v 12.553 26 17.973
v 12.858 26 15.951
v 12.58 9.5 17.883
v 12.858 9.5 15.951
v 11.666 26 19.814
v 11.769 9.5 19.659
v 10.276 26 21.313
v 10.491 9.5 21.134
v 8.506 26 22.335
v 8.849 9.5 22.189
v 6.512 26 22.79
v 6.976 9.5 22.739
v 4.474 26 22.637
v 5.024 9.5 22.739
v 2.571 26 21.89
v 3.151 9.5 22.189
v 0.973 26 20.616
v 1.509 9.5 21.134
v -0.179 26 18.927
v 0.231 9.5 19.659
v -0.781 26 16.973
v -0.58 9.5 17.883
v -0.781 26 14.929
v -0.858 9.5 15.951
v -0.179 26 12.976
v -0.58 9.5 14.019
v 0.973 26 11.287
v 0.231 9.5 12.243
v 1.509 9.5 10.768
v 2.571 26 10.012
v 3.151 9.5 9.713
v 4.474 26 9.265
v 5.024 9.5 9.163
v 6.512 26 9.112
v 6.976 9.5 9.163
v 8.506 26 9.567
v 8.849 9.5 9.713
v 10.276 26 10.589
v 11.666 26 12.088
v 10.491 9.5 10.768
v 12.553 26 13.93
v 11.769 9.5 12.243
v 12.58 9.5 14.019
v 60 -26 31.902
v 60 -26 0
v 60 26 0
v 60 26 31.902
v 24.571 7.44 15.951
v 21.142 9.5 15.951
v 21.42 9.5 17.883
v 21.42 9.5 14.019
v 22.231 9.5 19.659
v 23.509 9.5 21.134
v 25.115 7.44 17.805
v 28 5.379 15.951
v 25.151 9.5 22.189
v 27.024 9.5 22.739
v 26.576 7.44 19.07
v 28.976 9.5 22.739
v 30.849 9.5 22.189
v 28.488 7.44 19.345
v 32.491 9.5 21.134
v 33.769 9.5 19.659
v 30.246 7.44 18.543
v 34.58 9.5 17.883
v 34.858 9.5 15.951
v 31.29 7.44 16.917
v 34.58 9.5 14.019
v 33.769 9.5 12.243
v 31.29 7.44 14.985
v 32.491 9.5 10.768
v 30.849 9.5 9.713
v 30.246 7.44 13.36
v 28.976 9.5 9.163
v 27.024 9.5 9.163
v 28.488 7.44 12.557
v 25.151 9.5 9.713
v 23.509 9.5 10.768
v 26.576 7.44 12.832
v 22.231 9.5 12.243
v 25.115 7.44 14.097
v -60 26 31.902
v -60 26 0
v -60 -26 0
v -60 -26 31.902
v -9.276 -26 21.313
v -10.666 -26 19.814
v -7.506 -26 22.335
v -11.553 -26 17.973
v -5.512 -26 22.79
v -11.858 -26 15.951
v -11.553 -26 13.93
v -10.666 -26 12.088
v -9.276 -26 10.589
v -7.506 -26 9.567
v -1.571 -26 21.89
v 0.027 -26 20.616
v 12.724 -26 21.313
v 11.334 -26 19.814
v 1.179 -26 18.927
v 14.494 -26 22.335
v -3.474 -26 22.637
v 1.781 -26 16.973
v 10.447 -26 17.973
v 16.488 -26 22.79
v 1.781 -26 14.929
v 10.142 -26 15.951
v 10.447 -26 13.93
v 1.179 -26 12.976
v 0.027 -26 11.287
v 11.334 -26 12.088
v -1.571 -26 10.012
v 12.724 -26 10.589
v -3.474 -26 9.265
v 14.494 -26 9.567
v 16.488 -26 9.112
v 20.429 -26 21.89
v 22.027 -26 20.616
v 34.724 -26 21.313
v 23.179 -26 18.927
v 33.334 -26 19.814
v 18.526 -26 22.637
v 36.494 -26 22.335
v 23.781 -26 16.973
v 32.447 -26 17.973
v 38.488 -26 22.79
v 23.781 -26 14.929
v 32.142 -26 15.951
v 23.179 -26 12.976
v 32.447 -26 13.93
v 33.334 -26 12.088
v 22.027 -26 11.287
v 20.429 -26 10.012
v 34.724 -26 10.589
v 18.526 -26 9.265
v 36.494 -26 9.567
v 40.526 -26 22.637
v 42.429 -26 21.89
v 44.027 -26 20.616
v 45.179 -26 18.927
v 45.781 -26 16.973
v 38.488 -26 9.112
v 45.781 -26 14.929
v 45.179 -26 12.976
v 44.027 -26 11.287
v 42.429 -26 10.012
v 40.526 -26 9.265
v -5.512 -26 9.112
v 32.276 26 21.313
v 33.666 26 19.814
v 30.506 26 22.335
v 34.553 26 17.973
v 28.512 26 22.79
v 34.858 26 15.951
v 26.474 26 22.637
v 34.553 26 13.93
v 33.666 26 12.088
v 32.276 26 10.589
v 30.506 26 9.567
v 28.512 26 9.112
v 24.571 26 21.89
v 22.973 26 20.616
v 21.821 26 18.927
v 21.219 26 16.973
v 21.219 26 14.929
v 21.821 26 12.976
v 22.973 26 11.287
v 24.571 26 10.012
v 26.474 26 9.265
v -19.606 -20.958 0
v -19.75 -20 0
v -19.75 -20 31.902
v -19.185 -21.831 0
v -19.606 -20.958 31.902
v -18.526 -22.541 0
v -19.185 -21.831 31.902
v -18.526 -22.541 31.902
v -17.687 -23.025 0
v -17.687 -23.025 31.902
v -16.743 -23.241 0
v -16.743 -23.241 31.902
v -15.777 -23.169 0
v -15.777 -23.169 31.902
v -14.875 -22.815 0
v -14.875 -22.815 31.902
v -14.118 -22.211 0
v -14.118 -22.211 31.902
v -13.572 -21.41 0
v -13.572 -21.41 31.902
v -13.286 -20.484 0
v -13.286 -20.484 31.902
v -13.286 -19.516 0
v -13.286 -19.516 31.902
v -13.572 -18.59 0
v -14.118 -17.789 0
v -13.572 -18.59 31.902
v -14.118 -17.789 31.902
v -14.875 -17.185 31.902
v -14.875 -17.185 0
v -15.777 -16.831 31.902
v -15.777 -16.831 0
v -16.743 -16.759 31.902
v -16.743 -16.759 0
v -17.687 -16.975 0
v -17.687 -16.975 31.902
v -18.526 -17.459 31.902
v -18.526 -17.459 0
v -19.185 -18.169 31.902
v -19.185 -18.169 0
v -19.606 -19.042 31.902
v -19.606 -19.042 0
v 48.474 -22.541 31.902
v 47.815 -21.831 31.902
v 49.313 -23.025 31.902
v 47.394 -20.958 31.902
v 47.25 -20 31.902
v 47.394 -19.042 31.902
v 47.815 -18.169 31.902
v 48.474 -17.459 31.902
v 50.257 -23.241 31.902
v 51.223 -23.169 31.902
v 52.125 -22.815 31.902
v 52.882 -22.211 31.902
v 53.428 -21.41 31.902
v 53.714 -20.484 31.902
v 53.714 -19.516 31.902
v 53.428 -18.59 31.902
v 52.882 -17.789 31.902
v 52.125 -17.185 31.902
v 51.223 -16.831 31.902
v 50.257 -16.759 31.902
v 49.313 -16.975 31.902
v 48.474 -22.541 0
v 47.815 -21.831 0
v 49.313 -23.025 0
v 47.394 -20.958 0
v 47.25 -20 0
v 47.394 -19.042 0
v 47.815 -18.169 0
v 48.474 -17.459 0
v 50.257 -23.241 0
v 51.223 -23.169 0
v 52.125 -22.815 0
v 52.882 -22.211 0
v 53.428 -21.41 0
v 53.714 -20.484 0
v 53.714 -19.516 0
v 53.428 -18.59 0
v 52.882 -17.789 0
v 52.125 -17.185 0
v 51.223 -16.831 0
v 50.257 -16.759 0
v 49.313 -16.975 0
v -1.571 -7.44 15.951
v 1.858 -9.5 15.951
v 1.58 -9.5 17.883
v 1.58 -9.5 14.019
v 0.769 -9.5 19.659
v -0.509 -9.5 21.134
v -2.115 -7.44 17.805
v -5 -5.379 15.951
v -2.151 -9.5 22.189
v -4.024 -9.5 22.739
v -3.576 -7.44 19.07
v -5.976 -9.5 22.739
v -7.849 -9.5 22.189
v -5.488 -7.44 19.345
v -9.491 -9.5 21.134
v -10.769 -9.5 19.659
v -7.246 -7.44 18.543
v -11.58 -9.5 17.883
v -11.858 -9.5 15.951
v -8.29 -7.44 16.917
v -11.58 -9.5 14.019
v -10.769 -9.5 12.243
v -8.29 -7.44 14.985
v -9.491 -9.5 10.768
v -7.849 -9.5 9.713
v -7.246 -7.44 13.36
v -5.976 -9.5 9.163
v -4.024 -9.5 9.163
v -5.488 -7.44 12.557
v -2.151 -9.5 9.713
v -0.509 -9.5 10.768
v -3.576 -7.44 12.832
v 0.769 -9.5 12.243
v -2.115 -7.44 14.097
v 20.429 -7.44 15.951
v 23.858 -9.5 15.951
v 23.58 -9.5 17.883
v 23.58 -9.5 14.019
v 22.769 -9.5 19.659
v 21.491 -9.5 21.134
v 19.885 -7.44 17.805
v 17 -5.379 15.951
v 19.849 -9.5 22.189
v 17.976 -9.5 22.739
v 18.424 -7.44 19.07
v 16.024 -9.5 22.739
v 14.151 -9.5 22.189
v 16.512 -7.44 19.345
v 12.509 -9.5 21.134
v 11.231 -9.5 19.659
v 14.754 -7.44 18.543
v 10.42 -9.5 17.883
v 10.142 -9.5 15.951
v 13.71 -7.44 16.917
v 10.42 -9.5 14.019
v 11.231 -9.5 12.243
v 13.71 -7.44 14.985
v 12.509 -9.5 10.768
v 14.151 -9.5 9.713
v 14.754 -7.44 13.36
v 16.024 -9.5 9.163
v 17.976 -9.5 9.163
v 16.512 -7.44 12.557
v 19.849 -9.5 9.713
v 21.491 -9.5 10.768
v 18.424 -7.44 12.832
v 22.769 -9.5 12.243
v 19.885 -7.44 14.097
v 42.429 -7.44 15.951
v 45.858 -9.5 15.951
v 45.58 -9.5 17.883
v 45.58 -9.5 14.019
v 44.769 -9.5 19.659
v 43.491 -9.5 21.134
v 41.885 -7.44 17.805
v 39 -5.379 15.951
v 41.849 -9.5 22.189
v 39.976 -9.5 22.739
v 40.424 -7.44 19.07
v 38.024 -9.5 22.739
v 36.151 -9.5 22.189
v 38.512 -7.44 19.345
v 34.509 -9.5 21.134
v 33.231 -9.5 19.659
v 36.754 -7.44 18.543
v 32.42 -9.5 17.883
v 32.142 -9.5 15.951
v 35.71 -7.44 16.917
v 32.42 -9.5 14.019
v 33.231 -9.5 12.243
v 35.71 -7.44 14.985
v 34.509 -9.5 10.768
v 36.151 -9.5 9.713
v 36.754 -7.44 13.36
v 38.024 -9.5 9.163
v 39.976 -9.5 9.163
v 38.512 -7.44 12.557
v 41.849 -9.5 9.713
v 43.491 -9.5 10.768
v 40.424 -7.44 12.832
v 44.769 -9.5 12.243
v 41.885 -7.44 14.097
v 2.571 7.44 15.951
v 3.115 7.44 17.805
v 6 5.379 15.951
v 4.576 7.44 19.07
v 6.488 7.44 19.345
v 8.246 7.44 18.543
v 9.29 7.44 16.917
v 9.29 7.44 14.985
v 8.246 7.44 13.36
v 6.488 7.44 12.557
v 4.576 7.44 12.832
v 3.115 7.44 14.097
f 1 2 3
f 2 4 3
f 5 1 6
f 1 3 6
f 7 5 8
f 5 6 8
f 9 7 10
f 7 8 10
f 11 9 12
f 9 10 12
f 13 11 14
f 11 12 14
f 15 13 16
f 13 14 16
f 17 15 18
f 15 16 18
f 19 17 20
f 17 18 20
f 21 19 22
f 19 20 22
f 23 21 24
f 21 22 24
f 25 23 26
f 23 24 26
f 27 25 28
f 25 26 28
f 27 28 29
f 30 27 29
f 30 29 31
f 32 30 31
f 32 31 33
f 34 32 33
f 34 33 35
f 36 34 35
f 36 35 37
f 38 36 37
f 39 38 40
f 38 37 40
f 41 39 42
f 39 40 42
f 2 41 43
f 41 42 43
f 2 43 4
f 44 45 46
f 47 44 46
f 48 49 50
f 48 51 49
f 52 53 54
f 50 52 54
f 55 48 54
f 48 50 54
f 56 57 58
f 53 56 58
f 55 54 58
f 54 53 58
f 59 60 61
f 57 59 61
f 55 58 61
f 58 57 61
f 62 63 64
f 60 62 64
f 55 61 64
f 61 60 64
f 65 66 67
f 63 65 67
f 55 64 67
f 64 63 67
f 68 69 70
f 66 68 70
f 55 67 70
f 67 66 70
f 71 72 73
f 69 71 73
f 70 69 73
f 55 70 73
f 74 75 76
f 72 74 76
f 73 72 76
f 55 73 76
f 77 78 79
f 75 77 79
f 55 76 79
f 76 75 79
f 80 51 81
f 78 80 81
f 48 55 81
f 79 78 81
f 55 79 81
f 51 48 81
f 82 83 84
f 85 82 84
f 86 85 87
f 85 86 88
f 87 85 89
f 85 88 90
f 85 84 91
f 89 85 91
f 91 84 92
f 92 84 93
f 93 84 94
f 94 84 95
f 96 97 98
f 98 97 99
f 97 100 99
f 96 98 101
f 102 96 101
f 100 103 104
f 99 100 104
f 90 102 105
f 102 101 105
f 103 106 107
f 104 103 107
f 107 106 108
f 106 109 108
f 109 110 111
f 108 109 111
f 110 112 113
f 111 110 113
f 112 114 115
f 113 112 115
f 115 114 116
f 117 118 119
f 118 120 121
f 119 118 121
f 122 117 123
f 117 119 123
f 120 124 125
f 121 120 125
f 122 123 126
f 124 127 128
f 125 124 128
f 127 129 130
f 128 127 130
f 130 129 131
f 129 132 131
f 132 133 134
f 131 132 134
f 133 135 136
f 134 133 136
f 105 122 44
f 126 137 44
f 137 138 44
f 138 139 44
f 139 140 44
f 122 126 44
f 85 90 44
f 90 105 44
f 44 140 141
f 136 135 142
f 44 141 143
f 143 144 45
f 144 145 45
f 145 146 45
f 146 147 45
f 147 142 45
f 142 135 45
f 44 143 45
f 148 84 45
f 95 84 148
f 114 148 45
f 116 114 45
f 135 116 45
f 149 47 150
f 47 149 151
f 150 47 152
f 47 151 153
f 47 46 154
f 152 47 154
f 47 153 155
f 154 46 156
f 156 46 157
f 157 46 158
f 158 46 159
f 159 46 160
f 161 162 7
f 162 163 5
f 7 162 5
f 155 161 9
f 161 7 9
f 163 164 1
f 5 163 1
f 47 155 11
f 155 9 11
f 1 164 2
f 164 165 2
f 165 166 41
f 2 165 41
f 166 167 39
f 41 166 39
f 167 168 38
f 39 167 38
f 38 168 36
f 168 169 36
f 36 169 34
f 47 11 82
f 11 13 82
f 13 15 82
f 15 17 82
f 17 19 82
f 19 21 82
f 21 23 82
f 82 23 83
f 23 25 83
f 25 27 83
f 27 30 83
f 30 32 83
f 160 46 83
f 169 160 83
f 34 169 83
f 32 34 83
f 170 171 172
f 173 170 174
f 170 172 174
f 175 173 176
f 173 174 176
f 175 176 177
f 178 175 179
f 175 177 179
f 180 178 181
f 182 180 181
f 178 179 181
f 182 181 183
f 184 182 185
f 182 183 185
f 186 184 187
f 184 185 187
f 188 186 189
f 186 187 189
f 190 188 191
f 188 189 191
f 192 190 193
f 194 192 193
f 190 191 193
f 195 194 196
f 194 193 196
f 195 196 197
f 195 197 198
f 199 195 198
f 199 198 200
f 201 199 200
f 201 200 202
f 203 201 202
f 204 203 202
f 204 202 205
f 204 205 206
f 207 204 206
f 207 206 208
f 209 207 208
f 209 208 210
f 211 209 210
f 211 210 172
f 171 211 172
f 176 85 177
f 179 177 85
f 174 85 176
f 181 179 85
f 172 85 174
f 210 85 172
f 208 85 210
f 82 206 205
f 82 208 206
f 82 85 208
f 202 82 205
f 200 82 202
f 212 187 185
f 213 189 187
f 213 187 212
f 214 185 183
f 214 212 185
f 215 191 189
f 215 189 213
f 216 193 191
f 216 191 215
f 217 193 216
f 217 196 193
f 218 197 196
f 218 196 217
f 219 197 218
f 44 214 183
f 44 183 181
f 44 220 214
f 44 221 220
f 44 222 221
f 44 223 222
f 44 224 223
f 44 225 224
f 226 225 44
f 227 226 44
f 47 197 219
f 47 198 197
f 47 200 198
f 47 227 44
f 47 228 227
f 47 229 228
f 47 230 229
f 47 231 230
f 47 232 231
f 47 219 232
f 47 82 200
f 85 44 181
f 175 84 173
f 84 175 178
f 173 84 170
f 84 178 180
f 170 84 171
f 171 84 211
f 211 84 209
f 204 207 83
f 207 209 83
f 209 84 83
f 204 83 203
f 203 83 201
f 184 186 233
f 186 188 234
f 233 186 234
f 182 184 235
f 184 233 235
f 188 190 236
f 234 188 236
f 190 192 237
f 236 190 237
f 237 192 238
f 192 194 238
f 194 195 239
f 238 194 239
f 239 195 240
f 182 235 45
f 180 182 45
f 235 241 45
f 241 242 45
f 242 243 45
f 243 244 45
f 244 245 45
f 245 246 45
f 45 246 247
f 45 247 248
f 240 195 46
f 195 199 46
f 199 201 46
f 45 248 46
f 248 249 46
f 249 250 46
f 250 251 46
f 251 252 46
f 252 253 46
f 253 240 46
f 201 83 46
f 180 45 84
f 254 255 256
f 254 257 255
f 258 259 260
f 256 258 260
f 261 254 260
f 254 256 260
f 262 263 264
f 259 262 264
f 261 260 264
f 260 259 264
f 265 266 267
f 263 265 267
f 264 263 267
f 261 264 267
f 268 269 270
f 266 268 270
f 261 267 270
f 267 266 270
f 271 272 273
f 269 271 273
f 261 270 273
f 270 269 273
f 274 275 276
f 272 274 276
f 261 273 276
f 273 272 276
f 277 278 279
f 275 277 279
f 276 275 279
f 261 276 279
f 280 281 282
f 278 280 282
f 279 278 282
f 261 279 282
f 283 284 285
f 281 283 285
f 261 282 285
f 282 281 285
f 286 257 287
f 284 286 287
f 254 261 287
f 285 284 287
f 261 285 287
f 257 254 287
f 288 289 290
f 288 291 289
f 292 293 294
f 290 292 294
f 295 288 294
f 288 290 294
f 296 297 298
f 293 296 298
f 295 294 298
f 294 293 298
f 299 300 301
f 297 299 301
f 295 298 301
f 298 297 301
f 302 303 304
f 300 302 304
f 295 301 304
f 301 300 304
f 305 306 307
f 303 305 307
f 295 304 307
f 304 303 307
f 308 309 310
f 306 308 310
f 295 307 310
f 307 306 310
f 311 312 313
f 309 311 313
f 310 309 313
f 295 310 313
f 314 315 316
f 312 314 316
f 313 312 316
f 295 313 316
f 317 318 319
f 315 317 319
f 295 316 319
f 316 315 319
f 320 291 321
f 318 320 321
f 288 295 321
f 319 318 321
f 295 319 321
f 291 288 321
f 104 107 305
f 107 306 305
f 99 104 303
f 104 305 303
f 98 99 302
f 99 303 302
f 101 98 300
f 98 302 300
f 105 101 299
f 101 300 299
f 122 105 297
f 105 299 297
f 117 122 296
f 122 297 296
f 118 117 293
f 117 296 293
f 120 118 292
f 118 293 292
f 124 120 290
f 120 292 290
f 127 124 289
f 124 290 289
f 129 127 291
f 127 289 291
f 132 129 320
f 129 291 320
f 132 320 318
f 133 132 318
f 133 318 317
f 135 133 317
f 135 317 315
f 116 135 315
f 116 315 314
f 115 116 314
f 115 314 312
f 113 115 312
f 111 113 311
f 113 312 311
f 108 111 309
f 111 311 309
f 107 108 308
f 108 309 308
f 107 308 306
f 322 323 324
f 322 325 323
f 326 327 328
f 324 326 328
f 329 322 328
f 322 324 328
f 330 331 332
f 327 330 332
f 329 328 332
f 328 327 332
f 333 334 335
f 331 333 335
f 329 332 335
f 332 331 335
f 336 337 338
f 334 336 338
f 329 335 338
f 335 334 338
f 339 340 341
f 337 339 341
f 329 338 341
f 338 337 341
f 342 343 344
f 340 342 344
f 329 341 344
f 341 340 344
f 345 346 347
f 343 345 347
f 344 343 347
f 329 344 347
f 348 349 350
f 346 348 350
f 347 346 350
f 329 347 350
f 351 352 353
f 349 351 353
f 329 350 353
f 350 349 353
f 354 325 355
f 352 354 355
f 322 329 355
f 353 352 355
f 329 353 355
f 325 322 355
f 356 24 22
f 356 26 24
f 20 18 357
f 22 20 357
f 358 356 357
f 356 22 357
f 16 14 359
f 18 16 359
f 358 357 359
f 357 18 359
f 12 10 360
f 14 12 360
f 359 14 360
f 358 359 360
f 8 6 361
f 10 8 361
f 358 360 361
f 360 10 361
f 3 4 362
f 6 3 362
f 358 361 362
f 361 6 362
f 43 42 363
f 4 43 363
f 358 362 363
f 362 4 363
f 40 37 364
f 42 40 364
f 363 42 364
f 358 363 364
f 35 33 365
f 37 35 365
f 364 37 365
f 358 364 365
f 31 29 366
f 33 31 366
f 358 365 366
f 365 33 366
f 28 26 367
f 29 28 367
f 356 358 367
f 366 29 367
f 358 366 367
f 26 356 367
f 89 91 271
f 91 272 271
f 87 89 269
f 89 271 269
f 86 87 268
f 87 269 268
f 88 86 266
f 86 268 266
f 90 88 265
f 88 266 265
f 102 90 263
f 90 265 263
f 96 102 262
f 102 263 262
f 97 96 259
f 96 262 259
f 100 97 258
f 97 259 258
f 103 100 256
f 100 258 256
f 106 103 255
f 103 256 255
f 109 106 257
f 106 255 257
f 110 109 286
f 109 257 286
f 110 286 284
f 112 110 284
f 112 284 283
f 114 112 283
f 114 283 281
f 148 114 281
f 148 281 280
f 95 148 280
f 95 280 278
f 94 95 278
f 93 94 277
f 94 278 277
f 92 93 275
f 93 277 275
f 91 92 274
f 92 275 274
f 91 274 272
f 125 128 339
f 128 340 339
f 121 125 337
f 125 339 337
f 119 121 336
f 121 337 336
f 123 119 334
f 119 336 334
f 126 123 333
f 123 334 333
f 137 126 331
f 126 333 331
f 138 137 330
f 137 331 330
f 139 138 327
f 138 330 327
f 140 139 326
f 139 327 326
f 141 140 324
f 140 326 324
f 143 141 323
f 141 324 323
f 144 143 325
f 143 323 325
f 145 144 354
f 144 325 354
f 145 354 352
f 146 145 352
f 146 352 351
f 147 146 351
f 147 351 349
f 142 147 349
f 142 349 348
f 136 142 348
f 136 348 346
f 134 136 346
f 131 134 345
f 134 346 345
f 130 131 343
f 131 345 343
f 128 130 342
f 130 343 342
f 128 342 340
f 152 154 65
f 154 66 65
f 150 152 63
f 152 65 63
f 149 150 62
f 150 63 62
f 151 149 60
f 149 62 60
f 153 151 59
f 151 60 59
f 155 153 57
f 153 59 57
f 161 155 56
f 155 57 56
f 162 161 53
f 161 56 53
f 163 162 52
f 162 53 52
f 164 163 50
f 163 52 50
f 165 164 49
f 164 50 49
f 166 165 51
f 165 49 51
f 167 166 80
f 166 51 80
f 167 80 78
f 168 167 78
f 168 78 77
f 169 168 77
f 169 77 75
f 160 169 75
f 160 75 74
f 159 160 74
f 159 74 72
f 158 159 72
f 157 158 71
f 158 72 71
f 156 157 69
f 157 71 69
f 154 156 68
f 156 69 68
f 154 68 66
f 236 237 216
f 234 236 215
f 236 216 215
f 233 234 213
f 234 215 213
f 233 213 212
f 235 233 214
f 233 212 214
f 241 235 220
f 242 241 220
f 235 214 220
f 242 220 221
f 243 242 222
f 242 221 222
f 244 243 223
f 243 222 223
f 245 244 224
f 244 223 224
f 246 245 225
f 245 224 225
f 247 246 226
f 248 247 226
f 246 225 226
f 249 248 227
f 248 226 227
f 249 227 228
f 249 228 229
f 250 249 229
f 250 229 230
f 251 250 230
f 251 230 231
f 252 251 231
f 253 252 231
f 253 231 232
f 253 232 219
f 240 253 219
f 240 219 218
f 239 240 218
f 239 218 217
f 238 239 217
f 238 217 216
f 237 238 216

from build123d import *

# Parameters (mm, degrees)
F0_W           = 9.5
F0_H           = 6
F0_W_2         = 67
F0_H_2         = 46
F0_W_3         = 43.5
F1_DEPTH       = 31.9024
F2_D           = 6.5
F5_D           = 13.716
F5_DEPTH       = 16.5
F5_TIP         = 4.1207021253
F5_ON_F4_D     = 13.716
F5_ON_F4_DEPTH = 16.5
F5_ON_F4_TIP   = 4.1207021253


with BuildPart() as f1:
    # F0 (on Top) → F1 (new body)
    with BuildSketch(Plane.XY):
        with Locations((55.25, -23)):
            Rectangle(F0_W, F0_H)
        with Locations((17, -23)):
            Rectangle(F0_W_2, F0_H)
        with Locations((55.25, 3)):
            Rectangle(F0_W, F0_H_2)
        with Locations((-38.25, -23)):
            Rectangle(F0_W_3, F0_H)
        with Locations((17, 3)):
            Rectangle(F0_W_2, F0_H_2)
        with Locations((-38.25, 3)):
            Rectangle(F0_W_3, F0_H_2)
    extrude(amount=F1_DEPTH)

    # F2 (through all)
    with Locations(Plane(origin=(0, 0, 0), x_dir=(1, 0, 0), z_dir=(0, 0, -1))):
        with Locations((-16.5, 20), (50.5, 20)):
            Hole(F2_D / 2)

    # F5
    with Locations(Plane.XZ.offset(26)):
        with Locations((-5, 15.9512), (17, 15.9512), (39, 15.9512)):
            Hole(F5_D / 2, depth=F5_DEPTH)
            with Locations((0, 0, -(F5_DEPTH + F5_TIP / 2))):  # 118° drill point
                Cone(0, F5_D / 2, F5_TIP, mode=Mode.SUBTRACT)

    # F5 on F4
    with Locations(Plane(origin=(0, 26, 0), x_dir=(-1, 0, 0), z_dir=(0, 1, 0))):
        with Locations((-28, 15.9512), (-6, 15.9512)):
            Hole(F5_ON_F4_D / 2, depth=F5_ON_F4_DEPTH)
            with Locations((0, 0, -(F5_ON_F4_DEPTH + F5_ON_F4_TIP / 2))):  # 118° drill point
                Cone(0, F5_ON_F4_D / 2, F5_ON_F4_TIP, mode=Mode.SUBTRACT)


solid = f1.part
